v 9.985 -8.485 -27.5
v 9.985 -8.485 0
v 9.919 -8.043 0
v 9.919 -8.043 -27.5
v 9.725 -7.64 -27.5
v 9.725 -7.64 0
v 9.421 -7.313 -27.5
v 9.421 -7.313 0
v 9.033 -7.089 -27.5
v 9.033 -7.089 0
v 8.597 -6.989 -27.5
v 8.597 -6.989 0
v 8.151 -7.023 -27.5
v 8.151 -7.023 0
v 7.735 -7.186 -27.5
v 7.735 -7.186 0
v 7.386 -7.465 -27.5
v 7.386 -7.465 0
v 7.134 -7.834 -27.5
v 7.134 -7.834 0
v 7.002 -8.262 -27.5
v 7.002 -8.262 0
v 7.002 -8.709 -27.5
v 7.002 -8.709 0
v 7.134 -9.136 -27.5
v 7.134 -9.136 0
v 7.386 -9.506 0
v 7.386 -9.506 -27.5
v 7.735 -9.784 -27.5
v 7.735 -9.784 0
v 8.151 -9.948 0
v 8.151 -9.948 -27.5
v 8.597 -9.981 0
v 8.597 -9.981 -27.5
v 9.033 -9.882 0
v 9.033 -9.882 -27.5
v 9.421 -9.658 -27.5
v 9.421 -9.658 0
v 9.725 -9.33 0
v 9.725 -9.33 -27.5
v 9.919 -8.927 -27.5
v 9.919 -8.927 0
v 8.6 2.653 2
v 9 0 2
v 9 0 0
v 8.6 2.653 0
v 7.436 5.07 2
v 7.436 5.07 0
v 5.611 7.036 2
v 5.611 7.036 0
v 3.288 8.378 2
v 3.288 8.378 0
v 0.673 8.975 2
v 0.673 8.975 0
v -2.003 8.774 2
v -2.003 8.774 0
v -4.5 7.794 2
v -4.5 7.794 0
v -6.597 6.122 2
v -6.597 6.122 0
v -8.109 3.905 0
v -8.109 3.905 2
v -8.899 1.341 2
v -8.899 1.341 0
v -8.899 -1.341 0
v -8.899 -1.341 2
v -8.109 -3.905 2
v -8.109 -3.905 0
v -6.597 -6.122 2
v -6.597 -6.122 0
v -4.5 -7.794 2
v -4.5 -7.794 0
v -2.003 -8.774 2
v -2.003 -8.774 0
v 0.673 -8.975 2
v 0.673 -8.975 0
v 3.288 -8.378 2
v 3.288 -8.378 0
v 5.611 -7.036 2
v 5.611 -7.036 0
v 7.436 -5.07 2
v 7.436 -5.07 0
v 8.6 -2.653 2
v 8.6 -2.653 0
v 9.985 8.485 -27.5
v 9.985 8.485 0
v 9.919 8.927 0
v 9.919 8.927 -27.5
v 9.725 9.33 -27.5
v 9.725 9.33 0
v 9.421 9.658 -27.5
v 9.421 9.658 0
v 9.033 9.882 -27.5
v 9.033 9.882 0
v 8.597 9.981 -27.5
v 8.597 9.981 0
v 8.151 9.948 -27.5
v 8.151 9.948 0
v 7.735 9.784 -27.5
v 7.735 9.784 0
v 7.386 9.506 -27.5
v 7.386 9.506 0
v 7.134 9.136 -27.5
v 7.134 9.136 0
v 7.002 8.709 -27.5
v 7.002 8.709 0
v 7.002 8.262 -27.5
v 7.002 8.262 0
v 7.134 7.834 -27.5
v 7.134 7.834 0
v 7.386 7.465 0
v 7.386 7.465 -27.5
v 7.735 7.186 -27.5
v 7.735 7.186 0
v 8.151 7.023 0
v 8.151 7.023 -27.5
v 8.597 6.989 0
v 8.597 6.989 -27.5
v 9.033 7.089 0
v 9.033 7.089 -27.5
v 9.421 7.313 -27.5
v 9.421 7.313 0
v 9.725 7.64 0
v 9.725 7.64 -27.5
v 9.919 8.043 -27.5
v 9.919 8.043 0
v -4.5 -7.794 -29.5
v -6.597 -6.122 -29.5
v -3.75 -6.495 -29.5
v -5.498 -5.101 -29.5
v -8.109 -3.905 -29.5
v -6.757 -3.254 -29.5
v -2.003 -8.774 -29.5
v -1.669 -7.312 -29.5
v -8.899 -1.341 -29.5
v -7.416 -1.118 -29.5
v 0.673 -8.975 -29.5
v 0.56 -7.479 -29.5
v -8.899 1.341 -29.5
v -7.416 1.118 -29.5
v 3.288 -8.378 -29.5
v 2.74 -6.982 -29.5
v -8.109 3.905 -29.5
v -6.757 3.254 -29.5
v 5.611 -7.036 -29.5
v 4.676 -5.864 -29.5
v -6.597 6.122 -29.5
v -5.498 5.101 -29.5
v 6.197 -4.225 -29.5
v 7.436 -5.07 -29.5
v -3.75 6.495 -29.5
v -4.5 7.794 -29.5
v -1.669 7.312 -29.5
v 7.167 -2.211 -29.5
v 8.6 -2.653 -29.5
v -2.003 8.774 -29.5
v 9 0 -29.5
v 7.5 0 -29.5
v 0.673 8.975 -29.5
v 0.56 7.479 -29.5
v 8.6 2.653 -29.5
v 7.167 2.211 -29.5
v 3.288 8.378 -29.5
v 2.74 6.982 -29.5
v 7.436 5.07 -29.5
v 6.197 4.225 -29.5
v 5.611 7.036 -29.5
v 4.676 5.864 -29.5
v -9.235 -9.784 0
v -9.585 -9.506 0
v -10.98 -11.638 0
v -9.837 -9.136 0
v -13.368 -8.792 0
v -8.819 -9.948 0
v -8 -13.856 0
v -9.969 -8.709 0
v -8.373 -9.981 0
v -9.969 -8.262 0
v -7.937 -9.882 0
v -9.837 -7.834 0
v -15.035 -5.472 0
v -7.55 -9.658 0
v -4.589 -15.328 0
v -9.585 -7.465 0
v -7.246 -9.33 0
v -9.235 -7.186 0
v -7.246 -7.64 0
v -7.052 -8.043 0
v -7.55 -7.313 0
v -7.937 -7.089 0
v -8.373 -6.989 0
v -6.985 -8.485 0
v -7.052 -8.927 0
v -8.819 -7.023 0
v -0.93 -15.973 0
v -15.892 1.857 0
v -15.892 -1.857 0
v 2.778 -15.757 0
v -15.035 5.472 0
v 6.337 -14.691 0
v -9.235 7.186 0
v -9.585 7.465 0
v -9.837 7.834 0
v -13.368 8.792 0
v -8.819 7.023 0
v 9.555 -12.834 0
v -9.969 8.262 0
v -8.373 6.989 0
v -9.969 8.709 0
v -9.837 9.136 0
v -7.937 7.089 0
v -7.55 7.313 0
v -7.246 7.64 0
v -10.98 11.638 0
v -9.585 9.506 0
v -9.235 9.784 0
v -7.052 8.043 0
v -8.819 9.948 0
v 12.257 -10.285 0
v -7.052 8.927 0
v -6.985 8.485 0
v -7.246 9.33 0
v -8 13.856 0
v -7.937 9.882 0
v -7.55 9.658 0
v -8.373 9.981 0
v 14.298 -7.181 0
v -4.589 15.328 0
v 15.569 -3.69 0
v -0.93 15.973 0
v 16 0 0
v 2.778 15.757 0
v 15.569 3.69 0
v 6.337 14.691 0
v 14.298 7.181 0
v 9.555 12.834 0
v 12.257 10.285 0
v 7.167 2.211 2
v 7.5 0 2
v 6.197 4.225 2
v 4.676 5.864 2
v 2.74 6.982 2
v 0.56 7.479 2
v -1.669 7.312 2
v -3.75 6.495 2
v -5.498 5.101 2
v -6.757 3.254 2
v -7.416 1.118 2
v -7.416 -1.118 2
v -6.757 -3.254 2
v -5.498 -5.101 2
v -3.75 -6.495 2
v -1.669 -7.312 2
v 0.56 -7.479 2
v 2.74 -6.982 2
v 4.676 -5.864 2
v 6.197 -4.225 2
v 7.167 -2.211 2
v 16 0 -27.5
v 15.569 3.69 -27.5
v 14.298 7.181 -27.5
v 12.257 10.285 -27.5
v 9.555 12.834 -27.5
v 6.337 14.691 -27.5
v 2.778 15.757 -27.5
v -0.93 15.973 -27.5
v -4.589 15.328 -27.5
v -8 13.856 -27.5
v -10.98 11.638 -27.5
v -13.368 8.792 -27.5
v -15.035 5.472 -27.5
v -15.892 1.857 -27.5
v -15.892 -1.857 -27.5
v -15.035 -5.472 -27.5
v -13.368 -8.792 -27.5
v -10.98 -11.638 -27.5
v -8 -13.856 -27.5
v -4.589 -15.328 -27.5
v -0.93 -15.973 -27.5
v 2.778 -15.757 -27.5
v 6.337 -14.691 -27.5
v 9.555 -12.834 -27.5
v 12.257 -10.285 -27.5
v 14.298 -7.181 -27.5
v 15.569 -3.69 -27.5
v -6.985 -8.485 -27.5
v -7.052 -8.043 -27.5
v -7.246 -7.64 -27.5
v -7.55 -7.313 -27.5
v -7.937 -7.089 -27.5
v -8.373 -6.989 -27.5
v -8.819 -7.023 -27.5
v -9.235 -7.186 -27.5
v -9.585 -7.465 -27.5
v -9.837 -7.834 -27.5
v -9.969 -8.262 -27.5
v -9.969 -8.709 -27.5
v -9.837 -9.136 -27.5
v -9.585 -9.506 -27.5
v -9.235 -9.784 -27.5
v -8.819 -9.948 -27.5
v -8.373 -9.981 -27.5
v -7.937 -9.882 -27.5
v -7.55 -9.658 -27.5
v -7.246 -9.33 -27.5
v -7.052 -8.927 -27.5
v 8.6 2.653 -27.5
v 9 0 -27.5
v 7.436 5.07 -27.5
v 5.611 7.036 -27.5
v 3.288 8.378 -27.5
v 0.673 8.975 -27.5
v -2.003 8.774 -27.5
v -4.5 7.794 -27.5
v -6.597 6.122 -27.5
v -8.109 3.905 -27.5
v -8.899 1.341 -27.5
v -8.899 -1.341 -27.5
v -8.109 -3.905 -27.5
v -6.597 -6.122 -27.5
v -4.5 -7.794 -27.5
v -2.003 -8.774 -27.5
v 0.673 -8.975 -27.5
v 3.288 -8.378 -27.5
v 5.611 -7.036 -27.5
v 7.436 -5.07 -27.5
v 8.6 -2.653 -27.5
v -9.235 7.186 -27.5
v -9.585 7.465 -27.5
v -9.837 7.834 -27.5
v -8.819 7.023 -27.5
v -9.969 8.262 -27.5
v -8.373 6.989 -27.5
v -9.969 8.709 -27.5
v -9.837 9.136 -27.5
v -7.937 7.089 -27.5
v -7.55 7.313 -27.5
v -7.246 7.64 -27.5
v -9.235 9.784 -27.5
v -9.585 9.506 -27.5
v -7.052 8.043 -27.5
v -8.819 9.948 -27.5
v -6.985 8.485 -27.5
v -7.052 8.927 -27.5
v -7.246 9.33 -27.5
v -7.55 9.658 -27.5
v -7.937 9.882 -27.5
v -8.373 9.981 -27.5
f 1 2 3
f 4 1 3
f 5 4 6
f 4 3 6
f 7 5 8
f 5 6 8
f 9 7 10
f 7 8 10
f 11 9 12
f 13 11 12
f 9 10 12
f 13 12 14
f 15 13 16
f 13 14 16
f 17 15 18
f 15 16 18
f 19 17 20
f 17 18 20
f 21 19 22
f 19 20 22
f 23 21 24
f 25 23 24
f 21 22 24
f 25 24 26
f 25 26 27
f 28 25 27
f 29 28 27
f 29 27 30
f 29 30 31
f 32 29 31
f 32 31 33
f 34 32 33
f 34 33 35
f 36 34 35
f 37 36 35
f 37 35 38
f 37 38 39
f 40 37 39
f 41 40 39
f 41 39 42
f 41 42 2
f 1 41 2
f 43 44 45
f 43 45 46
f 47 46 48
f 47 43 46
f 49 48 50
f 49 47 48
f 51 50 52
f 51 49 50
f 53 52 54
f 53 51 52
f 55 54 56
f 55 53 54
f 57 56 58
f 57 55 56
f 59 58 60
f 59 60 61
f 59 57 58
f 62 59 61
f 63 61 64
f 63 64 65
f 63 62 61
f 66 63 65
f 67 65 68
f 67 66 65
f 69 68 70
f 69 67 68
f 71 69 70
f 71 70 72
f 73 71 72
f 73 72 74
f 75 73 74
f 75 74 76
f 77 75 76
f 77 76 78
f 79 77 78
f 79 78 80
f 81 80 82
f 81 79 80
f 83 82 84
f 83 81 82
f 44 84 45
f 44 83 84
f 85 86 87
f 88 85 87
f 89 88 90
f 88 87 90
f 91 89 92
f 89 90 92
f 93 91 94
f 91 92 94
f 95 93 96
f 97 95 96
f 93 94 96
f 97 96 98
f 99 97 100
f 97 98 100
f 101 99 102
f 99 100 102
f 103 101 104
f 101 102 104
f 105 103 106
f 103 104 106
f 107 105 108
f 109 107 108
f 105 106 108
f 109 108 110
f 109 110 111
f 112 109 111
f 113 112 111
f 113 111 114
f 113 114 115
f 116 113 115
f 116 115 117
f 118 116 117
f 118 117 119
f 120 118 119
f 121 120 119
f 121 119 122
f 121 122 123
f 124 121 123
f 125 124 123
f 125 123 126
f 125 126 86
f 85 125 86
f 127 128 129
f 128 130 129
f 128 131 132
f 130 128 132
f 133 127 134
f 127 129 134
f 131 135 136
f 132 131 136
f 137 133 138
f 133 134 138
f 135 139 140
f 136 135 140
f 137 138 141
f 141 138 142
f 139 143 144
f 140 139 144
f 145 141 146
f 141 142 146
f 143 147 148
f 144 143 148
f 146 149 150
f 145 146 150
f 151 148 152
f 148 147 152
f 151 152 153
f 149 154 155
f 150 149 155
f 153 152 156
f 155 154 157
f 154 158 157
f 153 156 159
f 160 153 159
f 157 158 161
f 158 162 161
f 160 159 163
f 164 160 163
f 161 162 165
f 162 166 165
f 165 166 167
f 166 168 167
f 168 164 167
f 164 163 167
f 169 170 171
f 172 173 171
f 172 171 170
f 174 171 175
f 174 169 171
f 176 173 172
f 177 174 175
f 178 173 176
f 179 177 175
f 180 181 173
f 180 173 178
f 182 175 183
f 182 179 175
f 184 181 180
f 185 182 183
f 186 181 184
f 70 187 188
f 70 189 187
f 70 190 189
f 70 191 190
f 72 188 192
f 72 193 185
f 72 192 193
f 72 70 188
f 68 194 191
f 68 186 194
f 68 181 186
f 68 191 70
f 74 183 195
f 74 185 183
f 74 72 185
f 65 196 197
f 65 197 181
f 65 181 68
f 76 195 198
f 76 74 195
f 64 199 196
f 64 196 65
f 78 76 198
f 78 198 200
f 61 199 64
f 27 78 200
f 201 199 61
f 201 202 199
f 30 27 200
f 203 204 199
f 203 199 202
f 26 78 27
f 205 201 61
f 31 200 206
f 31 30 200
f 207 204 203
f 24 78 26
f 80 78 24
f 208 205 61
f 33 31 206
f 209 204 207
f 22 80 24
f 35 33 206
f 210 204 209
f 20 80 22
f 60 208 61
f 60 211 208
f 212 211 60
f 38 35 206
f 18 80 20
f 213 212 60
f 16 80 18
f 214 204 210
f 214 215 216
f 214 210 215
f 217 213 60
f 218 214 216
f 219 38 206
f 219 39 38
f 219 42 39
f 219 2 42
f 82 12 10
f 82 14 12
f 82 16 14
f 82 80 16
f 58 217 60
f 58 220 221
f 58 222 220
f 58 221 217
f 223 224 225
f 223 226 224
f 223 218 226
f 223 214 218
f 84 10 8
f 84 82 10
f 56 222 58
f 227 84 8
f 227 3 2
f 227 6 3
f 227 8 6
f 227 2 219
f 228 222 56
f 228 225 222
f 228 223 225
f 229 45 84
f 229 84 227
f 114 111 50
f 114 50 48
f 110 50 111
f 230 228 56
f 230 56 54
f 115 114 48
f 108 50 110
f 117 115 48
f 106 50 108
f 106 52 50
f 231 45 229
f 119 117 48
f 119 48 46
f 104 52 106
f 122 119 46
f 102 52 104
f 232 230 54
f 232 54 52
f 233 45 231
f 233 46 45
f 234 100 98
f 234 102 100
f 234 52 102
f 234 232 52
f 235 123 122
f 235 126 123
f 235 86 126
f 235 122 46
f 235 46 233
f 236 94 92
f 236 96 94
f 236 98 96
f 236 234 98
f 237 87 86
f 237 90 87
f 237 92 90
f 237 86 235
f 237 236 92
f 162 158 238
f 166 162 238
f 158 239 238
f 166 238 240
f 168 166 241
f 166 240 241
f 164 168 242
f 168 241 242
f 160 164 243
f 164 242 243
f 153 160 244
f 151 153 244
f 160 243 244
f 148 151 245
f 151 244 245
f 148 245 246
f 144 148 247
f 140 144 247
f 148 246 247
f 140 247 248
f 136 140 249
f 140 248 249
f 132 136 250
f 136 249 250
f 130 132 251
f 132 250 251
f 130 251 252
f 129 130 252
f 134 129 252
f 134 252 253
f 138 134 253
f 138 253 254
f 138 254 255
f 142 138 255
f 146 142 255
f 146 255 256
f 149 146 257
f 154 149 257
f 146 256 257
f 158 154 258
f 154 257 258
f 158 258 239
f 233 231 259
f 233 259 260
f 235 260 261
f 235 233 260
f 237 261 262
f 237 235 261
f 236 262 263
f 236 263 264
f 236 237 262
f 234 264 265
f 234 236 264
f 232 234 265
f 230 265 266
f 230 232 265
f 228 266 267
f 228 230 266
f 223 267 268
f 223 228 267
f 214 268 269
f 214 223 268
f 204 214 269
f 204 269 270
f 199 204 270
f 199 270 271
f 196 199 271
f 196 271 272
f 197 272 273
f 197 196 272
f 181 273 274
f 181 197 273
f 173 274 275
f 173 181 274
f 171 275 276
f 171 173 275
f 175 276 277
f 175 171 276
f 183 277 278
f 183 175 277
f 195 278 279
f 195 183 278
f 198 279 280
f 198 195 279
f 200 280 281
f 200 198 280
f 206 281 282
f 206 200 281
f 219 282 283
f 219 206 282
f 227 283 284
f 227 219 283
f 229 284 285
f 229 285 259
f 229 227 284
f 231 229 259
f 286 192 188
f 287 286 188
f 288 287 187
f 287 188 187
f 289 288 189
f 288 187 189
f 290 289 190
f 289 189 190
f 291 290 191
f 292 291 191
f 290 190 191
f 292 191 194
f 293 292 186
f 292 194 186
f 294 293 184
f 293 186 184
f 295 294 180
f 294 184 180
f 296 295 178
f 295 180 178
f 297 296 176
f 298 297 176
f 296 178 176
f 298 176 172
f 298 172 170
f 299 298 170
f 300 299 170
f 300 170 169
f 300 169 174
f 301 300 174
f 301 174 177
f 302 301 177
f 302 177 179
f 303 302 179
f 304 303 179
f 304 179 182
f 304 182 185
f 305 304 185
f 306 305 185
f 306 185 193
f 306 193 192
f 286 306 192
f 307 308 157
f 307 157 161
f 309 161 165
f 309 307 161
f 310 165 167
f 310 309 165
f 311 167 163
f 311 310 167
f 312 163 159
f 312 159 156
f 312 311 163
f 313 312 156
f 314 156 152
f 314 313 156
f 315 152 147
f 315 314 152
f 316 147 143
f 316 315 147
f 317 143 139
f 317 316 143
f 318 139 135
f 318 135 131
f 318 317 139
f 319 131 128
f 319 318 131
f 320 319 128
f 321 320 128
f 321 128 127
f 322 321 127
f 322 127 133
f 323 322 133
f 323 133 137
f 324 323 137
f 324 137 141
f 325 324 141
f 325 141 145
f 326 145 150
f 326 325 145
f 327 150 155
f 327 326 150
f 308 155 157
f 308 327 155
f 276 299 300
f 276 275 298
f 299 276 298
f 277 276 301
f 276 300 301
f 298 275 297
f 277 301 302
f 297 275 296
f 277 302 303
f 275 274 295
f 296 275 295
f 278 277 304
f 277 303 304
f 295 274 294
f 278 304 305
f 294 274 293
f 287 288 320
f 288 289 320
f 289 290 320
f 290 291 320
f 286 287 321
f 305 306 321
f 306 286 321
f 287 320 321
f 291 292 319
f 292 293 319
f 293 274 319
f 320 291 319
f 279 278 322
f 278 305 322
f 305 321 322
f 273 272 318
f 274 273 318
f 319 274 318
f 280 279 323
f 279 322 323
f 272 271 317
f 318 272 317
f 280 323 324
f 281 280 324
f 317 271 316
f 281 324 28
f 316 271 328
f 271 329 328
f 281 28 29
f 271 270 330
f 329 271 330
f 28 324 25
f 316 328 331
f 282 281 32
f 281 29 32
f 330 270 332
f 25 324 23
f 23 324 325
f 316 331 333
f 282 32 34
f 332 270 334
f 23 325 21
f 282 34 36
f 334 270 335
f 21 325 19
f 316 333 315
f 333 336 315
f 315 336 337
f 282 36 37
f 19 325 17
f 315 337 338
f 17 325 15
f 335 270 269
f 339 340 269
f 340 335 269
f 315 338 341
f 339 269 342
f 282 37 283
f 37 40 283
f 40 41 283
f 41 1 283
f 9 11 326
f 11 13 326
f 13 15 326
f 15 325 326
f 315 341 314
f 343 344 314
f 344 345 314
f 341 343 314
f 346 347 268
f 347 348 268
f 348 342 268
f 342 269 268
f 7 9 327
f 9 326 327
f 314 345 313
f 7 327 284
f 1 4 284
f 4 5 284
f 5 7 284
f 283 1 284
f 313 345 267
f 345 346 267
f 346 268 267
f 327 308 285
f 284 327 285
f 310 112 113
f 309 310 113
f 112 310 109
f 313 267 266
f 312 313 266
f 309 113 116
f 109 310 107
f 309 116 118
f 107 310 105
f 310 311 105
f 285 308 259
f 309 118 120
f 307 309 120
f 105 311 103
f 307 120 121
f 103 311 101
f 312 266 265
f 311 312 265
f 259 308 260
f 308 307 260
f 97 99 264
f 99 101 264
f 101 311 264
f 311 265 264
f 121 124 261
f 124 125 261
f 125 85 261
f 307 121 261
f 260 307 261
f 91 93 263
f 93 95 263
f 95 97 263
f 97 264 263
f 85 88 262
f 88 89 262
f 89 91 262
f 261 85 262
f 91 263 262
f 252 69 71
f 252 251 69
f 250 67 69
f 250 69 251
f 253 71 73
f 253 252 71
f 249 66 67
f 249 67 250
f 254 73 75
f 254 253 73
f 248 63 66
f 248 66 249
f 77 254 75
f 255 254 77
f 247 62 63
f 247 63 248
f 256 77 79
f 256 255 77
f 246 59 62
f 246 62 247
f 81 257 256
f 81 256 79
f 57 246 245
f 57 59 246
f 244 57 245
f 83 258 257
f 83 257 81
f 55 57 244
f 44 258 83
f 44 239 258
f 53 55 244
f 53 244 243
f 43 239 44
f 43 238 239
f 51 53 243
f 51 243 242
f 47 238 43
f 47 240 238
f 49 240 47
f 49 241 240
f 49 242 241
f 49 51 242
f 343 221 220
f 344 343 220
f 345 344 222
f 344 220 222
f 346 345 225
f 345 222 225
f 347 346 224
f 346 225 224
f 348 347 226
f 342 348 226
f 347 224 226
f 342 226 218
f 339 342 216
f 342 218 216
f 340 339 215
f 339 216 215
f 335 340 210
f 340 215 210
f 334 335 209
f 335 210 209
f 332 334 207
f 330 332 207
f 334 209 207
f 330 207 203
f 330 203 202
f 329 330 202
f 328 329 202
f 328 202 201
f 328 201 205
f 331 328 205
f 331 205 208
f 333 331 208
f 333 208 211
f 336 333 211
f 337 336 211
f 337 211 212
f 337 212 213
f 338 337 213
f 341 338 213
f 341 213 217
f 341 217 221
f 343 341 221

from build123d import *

# Parameters (mm, degrees)
SKETCH1_R           = 16
SKETCH1_R_2         = 9
SKETCH1_R_3         = 7.5
BOSS_EXTRUDE1_DEPTH = 27.5
BOSS_EXTRUDE2_START = 2
SKETCH1_3_R         = 9
SKETCH1_3_R_2       = 7.5
BOSS_EXTRUDE2_DEPTH = 2
BOSS_EXTRUDE3_START = -27.5
SKETCH1_4_R         = 9
SKETCH1_4_R_2       = 7.5
BOSS_EXTRUDE3_DEPTH = 2
SKETCH2_R           = 1.5
CUT_EXTRUDE1_DEPTH  = 38.17862289


with BuildPart() as part:
    # Sketch1 → Boss-Extrude1 (new body)
    # profile 1 of 2: a face of its own
    with BuildSketch(Plane.XY):
        Circle(SKETCH1_R)
        Circle(SKETCH1_R_2, mode=Mode.SUBTRACT)
    # profile 2 of 2: a face of its own
    with BuildSketch(Plane.XY):
        Circle(SKETCH1_R_2)
        Circle(SKETCH1_R_3, mode=Mode.SUBTRACT)
    extrude(amount=-BOSS_EXTRUDE1_DEPTH)

    # Sketch1<3> → Boss-Extrude2 (add)
    with BuildSketch(Plane.XY.offset(BOSS_EXTRUDE2_START)):
        Circle(SKETCH1_3_R)
        Circle(SKETCH1_3_R_2, mode=Mode.SUBTRACT)
    extrude(amount=-BOSS_EXTRUDE2_DEPTH)

    # Sketch1<4> → Boss-Extrude3 (add)
    with BuildSketch(Plane.XY.offset(BOSS_EXTRUDE3_START)):
        Circle(SKETCH1_4_R)
        Circle(SKETCH1_4_R_2, mode=Mode.SUBTRACT)
    extrude(amount=-BOSS_EXTRUDE3_DEPTH)

    # Sketch2 → Cut-Extrude1 (cut, through all)
    with BuildSketch(Plane.XY):
        with Locations((-8.485281374, 8.485281374)):
            Circle(SKETCH2_R)
        with Locations((8.485281374, 8.485281374)):
            Circle(SKETCH2_R)
        with Locations((8.485281374, -8.485281374)):
            Circle(SKETCH2_R)
        with Locations((-8.485281374, -8.485281374)):
            Circle(SKETCH2_R)
    extrude(amount=-CUT_EXTRUDE1_DEPTH, mode=Mode.SUBTRACT)


solid = part.part
